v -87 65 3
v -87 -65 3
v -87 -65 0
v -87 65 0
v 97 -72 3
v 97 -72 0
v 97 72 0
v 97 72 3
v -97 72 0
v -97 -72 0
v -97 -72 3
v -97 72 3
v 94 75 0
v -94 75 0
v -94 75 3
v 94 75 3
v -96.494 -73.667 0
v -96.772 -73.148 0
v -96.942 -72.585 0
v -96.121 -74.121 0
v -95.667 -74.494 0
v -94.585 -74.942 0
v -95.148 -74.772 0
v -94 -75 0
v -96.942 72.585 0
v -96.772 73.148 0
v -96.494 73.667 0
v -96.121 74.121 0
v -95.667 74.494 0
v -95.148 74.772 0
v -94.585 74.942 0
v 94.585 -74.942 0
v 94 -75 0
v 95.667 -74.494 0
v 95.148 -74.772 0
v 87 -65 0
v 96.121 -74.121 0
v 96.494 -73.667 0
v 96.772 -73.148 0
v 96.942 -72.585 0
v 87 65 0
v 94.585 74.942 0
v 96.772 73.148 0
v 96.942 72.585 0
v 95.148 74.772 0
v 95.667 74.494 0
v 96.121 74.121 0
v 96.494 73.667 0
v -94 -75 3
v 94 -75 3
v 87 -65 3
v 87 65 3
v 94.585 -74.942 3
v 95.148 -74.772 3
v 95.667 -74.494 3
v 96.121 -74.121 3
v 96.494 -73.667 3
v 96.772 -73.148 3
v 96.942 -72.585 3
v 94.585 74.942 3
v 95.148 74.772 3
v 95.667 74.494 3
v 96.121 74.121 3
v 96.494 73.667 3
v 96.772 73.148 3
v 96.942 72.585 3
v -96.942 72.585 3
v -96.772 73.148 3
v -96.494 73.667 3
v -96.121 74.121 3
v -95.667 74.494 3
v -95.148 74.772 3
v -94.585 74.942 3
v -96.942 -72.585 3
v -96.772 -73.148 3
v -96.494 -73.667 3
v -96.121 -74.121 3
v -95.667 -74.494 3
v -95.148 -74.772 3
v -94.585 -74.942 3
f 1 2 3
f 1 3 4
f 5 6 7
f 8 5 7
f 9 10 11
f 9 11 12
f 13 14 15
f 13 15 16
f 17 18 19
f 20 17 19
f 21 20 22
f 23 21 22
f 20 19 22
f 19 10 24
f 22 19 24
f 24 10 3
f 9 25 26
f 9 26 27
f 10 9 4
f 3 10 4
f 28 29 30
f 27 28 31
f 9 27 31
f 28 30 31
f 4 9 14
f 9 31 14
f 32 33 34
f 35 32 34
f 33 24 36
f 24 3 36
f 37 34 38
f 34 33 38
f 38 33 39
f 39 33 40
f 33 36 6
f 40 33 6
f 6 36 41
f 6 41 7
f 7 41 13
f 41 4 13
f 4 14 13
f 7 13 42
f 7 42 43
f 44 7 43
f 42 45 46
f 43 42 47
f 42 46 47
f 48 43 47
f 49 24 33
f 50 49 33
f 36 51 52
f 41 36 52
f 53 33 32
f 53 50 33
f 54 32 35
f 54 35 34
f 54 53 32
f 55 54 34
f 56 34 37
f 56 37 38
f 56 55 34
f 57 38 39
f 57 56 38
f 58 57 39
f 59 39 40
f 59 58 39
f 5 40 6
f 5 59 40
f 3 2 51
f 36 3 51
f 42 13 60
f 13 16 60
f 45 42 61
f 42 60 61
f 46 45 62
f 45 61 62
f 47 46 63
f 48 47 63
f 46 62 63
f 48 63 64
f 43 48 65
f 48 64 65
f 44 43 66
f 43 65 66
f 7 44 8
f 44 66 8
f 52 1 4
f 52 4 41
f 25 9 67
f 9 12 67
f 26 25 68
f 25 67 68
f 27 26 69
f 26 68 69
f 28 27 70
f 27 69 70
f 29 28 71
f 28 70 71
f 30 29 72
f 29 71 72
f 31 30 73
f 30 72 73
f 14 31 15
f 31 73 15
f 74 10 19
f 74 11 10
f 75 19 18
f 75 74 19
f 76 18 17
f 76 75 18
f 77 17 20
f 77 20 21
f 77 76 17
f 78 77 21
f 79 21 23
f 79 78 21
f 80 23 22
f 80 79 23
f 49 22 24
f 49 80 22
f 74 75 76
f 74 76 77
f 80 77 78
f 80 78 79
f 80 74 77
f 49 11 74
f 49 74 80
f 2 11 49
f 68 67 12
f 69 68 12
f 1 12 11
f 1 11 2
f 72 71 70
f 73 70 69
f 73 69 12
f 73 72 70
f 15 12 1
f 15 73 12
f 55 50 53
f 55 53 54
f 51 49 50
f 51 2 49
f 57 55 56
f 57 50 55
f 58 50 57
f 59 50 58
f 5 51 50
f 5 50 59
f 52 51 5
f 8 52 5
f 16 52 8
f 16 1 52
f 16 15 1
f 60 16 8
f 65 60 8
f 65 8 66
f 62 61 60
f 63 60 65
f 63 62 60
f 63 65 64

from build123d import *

# Parameters (mm, degrees)
F0_W     = 194
F0_H     = 150
F1_DEPTH = 3
F2_W     = 174
F2_H     = 130
F3_DEPTH = 3
F4_R     = 3


with BuildPart() as f1:
    # F0 (on Top) → F1 (new body)
    with BuildSketch(Plane.XY):
        Rectangle(F0_W, F0_H)
    extrude(amount=F1_DEPTH)

    # F2 (on face) → F3 (cut, through all)
    with BuildSketch(Plane.XY.offset(3)):
        Rectangle(F2_W, F2_H)
    extrude(amount=-F3_DEPTH, mode=Mode.SUBTRACT)

    # F4
    f4_edges = [f1.edges().sort_by_distance(p)[0] for p in [
        (-97, -75, 1.5),
        (97, -75, 1.5),
        (97, 75, 1.5),
        (-97, 75, 1.5),
    ]]
    fillet(f4_edges, radius=F4_R)


solid = f1.part
